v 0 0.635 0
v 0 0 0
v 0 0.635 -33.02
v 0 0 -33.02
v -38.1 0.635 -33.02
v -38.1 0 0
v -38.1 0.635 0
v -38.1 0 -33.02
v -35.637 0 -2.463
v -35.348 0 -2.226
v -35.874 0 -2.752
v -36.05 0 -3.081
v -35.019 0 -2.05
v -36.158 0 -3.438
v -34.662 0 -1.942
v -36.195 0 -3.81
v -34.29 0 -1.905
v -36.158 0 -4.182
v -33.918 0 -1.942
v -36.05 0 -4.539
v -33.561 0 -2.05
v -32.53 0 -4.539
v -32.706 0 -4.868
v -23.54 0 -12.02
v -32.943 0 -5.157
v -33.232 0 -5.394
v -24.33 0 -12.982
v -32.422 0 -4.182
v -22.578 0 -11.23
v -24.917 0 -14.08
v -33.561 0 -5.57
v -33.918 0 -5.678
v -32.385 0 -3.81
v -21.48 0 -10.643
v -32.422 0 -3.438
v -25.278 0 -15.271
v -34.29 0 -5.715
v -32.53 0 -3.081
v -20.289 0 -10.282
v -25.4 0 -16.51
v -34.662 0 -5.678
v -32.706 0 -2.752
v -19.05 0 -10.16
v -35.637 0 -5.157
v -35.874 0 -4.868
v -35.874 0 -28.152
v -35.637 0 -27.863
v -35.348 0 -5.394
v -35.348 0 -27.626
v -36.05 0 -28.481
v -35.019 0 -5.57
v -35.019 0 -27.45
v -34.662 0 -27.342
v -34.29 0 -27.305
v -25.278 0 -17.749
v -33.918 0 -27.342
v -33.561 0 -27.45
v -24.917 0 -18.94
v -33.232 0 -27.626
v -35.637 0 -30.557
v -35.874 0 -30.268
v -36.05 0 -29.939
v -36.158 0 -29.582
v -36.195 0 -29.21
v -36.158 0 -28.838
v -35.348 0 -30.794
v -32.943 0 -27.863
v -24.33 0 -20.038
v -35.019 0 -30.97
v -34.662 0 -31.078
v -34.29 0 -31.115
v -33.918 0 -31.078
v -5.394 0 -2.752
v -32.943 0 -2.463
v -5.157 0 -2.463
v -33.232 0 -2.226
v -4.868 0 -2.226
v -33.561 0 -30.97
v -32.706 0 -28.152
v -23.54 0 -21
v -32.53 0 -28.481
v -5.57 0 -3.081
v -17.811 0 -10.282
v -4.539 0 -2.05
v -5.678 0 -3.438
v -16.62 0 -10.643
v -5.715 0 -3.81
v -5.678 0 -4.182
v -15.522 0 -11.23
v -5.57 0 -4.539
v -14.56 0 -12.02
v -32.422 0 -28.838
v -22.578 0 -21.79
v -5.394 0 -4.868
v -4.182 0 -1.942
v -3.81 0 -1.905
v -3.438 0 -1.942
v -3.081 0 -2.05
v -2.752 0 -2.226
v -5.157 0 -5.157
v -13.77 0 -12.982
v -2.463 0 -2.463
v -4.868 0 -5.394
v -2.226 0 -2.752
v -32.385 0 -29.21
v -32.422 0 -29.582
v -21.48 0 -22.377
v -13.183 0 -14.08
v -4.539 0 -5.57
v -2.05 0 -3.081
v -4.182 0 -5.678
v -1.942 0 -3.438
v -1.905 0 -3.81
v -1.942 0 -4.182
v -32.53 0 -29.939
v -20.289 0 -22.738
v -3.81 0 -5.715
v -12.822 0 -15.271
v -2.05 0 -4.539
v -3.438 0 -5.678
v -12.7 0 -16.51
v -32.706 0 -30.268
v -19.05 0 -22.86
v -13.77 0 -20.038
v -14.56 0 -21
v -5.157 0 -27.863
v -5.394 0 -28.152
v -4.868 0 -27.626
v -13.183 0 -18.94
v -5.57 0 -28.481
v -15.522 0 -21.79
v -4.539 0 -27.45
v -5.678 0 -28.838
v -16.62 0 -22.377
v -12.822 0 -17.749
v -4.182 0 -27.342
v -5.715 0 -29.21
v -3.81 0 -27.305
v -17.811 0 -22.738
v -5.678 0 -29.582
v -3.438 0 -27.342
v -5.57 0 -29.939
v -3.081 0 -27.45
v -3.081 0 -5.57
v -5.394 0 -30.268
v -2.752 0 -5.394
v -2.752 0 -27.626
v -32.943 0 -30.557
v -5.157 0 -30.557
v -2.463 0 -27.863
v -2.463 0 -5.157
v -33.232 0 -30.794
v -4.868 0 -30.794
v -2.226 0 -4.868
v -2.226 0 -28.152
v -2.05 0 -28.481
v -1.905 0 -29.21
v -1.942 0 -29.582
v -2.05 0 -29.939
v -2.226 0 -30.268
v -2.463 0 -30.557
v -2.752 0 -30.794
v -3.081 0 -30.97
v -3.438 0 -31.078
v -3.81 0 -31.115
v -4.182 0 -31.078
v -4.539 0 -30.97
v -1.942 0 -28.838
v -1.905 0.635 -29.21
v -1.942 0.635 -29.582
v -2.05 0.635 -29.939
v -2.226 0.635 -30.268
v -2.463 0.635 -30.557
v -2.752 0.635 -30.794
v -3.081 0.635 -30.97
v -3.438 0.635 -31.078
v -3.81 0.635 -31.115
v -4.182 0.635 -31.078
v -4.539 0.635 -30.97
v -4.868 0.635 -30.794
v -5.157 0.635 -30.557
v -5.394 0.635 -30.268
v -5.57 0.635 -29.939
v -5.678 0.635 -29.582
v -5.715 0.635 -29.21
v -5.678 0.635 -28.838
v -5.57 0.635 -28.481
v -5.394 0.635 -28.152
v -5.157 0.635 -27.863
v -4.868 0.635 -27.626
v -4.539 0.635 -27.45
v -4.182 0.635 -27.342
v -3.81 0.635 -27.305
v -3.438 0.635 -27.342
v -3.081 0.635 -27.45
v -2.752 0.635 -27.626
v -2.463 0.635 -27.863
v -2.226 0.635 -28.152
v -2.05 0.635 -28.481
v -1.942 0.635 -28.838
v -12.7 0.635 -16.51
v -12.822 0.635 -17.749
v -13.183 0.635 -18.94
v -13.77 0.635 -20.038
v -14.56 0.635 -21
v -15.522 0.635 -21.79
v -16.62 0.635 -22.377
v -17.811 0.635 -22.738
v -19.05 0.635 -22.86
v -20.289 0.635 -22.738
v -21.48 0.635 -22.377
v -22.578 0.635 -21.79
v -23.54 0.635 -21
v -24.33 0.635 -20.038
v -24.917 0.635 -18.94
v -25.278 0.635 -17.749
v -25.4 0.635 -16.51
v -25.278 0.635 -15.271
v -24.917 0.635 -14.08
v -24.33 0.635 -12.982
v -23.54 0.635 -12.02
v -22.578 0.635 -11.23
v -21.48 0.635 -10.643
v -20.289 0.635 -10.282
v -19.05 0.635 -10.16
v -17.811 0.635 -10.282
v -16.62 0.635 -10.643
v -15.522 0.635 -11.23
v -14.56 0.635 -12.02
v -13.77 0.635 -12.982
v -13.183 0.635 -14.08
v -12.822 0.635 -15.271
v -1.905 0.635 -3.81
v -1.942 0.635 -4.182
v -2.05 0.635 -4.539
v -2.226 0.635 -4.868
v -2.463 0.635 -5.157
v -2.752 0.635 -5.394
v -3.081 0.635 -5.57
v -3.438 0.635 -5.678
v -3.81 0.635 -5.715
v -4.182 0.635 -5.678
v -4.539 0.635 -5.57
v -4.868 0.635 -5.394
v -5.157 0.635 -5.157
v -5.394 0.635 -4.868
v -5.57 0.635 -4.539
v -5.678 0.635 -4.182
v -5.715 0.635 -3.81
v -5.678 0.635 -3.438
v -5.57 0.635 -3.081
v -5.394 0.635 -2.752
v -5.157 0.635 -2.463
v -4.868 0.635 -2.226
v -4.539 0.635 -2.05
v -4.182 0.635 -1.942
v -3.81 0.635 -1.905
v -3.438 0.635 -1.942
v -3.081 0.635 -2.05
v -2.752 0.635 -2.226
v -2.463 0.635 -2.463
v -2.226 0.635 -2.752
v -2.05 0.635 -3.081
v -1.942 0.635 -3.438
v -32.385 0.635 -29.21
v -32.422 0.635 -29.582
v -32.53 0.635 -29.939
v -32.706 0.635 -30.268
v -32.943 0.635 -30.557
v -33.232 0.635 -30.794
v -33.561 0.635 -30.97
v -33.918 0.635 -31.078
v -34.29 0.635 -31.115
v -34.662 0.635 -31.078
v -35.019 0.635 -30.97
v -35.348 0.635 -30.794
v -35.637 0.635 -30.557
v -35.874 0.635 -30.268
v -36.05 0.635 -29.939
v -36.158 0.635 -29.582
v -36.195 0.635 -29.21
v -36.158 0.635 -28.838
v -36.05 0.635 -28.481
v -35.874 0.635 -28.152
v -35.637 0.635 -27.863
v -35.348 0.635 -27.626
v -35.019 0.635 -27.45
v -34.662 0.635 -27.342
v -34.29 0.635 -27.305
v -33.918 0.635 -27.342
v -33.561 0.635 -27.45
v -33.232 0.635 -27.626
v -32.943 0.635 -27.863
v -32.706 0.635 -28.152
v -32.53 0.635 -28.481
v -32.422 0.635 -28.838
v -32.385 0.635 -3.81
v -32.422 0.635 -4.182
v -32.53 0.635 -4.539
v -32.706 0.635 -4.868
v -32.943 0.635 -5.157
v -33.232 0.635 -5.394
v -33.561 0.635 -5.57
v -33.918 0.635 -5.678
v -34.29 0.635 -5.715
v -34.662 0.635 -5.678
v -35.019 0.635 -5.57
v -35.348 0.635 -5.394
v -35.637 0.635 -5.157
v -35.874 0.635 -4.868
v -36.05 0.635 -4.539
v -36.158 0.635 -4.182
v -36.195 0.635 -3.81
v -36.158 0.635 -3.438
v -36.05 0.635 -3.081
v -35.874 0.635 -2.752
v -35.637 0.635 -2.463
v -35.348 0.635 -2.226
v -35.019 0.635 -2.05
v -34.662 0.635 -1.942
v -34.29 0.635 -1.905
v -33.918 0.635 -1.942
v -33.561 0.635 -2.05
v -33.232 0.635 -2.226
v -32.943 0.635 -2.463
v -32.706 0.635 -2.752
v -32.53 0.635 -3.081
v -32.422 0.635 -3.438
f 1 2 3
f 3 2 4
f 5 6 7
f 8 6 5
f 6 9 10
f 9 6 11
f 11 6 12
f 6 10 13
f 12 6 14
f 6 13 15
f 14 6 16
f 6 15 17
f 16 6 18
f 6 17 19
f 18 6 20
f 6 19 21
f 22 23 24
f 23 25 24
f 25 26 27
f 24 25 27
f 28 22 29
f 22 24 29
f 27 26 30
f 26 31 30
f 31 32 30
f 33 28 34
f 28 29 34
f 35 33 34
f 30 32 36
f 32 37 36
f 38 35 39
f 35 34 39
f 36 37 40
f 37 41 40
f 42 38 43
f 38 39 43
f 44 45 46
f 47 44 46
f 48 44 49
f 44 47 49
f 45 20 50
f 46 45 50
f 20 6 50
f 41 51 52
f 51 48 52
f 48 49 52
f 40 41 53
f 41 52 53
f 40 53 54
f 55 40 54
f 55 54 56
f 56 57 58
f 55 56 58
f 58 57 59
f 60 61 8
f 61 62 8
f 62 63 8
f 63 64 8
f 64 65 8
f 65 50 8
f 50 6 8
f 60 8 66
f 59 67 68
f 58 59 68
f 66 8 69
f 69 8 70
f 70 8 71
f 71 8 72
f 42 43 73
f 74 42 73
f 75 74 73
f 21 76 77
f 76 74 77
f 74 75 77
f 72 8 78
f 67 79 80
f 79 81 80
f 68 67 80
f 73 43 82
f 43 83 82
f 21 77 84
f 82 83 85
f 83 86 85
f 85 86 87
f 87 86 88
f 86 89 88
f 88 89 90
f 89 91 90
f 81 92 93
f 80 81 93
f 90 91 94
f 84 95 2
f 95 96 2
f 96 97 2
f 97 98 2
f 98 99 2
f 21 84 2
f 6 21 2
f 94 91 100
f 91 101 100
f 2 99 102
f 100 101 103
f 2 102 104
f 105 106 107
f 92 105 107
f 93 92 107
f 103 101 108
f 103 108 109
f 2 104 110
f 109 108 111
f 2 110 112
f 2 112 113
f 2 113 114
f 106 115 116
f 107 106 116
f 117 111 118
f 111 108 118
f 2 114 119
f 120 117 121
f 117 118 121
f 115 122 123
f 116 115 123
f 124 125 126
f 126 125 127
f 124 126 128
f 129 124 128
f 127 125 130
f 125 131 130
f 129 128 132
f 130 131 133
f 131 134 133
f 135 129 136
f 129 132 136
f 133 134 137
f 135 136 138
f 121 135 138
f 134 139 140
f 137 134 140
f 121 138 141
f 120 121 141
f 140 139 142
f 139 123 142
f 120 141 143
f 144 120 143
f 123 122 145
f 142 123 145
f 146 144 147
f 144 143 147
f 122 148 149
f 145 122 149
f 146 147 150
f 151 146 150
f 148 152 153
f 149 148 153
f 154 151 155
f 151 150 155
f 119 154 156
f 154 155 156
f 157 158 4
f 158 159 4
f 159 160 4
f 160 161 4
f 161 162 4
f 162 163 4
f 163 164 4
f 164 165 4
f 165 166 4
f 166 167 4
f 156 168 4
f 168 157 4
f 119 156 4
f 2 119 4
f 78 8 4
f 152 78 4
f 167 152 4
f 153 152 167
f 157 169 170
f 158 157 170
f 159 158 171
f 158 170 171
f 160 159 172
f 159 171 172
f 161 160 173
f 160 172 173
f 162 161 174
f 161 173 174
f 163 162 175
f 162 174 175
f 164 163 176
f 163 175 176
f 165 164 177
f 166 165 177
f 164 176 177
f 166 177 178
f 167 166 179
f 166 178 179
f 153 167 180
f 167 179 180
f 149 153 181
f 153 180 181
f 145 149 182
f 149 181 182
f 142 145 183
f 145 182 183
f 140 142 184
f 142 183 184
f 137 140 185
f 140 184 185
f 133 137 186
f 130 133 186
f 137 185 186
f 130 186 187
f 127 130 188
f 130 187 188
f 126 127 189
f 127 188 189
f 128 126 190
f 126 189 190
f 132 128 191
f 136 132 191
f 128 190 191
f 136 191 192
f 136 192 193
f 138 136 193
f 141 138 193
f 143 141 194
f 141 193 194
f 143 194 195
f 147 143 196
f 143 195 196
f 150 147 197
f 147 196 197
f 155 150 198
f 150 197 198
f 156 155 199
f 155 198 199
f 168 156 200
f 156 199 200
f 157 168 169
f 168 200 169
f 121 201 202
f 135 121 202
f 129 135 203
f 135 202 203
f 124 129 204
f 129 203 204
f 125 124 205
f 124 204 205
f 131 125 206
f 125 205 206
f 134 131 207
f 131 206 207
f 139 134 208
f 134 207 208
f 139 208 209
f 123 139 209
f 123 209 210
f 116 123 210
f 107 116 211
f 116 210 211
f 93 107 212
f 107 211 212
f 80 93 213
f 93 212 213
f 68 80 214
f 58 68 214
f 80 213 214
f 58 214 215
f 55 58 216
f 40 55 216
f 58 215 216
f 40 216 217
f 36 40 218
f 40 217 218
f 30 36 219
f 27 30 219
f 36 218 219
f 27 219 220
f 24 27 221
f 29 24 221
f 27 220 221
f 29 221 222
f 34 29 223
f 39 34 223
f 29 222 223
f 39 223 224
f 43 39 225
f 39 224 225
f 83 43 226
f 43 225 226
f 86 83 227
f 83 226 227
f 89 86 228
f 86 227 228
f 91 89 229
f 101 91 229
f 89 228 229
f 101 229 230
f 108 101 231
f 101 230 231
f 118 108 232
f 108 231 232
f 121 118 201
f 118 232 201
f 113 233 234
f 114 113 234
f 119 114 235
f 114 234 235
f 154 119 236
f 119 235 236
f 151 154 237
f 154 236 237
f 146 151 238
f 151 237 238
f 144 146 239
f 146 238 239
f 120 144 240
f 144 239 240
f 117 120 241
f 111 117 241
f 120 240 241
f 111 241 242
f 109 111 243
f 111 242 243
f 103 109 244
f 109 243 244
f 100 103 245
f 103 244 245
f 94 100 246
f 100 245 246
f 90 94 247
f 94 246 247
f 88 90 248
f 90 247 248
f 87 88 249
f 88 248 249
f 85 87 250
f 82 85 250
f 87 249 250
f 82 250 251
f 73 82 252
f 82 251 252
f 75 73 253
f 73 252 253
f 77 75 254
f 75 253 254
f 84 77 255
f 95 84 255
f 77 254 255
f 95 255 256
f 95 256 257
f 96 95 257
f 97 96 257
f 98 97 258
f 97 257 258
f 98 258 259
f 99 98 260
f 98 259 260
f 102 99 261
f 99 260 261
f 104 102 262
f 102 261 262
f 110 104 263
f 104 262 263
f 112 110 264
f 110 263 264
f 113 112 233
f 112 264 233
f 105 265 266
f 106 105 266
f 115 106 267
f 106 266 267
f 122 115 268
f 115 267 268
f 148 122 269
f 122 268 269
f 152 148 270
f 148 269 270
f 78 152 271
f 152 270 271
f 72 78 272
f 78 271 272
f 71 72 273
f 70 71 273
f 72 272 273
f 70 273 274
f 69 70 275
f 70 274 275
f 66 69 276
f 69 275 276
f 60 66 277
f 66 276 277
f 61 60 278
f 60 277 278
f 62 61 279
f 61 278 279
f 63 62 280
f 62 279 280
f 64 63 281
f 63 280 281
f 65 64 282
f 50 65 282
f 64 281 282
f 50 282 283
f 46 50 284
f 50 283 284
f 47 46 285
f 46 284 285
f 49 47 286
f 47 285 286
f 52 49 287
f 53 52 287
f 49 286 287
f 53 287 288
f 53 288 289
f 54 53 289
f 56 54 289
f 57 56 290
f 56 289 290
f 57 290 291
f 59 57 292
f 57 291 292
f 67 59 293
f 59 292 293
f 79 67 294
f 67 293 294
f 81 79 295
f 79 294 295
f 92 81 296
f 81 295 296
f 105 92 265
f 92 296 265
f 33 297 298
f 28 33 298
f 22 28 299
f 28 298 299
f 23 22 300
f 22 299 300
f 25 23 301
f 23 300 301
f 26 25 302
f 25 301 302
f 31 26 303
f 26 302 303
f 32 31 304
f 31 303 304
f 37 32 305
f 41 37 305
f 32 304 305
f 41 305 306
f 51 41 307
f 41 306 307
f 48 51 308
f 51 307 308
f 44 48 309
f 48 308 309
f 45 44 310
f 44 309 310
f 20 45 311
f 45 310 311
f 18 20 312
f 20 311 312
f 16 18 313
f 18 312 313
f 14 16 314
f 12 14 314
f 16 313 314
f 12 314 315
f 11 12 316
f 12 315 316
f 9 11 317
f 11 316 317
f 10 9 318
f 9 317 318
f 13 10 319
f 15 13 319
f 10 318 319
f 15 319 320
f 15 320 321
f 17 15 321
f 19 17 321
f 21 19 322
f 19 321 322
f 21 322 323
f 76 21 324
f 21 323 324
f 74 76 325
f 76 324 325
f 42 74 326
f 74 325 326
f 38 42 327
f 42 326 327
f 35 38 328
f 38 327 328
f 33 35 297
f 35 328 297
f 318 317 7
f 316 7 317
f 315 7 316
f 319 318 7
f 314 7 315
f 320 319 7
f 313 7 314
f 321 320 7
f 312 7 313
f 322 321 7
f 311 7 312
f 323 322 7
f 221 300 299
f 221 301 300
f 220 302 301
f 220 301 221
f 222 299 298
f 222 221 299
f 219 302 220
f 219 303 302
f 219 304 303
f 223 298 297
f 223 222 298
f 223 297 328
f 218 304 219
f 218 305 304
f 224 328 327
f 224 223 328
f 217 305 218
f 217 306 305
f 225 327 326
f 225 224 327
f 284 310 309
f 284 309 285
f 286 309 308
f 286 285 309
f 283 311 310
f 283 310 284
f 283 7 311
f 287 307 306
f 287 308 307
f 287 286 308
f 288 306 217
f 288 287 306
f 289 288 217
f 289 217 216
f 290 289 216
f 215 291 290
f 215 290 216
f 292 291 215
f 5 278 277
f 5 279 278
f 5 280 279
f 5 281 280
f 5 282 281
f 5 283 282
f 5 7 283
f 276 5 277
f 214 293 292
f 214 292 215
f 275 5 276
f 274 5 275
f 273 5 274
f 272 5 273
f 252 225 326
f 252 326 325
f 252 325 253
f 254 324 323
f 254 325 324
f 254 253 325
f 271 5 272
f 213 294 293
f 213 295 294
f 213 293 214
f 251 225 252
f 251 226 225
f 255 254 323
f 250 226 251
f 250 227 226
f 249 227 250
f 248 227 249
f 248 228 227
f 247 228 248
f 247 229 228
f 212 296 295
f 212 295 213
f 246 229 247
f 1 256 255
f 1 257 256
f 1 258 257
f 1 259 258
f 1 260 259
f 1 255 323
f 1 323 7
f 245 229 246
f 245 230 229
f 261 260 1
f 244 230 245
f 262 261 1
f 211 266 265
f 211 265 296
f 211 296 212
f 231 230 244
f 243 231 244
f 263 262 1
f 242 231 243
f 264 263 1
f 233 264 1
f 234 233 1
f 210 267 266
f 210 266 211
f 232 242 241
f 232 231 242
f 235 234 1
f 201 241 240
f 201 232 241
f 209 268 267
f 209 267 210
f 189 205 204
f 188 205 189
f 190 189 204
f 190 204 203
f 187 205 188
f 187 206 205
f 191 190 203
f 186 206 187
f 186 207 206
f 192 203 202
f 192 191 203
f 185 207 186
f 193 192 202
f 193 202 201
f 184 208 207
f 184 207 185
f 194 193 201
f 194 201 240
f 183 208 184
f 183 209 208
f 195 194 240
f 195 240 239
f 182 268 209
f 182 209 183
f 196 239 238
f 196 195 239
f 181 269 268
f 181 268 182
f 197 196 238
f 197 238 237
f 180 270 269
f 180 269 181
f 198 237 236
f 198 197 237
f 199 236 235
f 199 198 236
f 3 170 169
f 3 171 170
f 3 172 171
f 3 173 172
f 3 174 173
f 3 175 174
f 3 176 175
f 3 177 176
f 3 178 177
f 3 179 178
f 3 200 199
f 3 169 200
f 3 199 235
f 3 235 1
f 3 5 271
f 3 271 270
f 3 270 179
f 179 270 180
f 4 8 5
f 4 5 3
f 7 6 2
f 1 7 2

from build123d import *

# Parameters (mm, degrees)
SKETCH1_W           = 38.1
SKETCH1_H           = 33.02
BOSS_EXTRUDE1_DEPTH = 0.635
SKETCH2_R           = 1.905
CUT_EXTRUDE1_DEPTH  = 0.635
SKETCH3_R           = 6.35
CUT_EXTRUDE2_DEPTH  = 0.635


with BuildPart() as part:
    # Sketch1 → Boss-Extrude1 (new body)
    with BuildSketch(Plane(origin=(0, 0, 0), x_dir=(1, 0, 0), z_dir=(0, 1, 0))):
        with Locations((-19.05, 16.51)):
            Rectangle(SKETCH1_W, SKETCH1_H)
    extrude(amount=BOSS_EXTRUDE1_DEPTH)

    # Sketch2 → Cut-Extrude1 (cut)
    with BuildSketch(Plane(origin=(0, 0.635, 0), x_dir=(1, 0, 0), z_dir=(0, 1, 0))):
        with Locations((-34.29, 29.21)):
            Circle(SKETCH2_R)
        with Locations((-34.29, 3.81)):
            Circle(SKETCH2_R)
        with Locations((-3.81, 29.21)):
            Circle(SKETCH2_R)
        with Locations((-3.81, 3.81)):
            Circle(SKETCH2_R)
    extrude(amount=-CUT_EXTRUDE1_DEPTH, mode=Mode.SUBTRACT)

    # Sketch3 → Cut-Extrude2 (cut)
    with BuildSketch(Plane(origin=(0, 0.635, 0), x_dir=(1, 0, 0), z_dir=(0, 1, 0))):
        with Locations((-19.05, 16.51)):
            Circle(SKETCH3_R)
    extrude(amount=-CUT_EXTRUDE2_DEPTH, mode=Mode.SUBTRACT)


solid = part.part
